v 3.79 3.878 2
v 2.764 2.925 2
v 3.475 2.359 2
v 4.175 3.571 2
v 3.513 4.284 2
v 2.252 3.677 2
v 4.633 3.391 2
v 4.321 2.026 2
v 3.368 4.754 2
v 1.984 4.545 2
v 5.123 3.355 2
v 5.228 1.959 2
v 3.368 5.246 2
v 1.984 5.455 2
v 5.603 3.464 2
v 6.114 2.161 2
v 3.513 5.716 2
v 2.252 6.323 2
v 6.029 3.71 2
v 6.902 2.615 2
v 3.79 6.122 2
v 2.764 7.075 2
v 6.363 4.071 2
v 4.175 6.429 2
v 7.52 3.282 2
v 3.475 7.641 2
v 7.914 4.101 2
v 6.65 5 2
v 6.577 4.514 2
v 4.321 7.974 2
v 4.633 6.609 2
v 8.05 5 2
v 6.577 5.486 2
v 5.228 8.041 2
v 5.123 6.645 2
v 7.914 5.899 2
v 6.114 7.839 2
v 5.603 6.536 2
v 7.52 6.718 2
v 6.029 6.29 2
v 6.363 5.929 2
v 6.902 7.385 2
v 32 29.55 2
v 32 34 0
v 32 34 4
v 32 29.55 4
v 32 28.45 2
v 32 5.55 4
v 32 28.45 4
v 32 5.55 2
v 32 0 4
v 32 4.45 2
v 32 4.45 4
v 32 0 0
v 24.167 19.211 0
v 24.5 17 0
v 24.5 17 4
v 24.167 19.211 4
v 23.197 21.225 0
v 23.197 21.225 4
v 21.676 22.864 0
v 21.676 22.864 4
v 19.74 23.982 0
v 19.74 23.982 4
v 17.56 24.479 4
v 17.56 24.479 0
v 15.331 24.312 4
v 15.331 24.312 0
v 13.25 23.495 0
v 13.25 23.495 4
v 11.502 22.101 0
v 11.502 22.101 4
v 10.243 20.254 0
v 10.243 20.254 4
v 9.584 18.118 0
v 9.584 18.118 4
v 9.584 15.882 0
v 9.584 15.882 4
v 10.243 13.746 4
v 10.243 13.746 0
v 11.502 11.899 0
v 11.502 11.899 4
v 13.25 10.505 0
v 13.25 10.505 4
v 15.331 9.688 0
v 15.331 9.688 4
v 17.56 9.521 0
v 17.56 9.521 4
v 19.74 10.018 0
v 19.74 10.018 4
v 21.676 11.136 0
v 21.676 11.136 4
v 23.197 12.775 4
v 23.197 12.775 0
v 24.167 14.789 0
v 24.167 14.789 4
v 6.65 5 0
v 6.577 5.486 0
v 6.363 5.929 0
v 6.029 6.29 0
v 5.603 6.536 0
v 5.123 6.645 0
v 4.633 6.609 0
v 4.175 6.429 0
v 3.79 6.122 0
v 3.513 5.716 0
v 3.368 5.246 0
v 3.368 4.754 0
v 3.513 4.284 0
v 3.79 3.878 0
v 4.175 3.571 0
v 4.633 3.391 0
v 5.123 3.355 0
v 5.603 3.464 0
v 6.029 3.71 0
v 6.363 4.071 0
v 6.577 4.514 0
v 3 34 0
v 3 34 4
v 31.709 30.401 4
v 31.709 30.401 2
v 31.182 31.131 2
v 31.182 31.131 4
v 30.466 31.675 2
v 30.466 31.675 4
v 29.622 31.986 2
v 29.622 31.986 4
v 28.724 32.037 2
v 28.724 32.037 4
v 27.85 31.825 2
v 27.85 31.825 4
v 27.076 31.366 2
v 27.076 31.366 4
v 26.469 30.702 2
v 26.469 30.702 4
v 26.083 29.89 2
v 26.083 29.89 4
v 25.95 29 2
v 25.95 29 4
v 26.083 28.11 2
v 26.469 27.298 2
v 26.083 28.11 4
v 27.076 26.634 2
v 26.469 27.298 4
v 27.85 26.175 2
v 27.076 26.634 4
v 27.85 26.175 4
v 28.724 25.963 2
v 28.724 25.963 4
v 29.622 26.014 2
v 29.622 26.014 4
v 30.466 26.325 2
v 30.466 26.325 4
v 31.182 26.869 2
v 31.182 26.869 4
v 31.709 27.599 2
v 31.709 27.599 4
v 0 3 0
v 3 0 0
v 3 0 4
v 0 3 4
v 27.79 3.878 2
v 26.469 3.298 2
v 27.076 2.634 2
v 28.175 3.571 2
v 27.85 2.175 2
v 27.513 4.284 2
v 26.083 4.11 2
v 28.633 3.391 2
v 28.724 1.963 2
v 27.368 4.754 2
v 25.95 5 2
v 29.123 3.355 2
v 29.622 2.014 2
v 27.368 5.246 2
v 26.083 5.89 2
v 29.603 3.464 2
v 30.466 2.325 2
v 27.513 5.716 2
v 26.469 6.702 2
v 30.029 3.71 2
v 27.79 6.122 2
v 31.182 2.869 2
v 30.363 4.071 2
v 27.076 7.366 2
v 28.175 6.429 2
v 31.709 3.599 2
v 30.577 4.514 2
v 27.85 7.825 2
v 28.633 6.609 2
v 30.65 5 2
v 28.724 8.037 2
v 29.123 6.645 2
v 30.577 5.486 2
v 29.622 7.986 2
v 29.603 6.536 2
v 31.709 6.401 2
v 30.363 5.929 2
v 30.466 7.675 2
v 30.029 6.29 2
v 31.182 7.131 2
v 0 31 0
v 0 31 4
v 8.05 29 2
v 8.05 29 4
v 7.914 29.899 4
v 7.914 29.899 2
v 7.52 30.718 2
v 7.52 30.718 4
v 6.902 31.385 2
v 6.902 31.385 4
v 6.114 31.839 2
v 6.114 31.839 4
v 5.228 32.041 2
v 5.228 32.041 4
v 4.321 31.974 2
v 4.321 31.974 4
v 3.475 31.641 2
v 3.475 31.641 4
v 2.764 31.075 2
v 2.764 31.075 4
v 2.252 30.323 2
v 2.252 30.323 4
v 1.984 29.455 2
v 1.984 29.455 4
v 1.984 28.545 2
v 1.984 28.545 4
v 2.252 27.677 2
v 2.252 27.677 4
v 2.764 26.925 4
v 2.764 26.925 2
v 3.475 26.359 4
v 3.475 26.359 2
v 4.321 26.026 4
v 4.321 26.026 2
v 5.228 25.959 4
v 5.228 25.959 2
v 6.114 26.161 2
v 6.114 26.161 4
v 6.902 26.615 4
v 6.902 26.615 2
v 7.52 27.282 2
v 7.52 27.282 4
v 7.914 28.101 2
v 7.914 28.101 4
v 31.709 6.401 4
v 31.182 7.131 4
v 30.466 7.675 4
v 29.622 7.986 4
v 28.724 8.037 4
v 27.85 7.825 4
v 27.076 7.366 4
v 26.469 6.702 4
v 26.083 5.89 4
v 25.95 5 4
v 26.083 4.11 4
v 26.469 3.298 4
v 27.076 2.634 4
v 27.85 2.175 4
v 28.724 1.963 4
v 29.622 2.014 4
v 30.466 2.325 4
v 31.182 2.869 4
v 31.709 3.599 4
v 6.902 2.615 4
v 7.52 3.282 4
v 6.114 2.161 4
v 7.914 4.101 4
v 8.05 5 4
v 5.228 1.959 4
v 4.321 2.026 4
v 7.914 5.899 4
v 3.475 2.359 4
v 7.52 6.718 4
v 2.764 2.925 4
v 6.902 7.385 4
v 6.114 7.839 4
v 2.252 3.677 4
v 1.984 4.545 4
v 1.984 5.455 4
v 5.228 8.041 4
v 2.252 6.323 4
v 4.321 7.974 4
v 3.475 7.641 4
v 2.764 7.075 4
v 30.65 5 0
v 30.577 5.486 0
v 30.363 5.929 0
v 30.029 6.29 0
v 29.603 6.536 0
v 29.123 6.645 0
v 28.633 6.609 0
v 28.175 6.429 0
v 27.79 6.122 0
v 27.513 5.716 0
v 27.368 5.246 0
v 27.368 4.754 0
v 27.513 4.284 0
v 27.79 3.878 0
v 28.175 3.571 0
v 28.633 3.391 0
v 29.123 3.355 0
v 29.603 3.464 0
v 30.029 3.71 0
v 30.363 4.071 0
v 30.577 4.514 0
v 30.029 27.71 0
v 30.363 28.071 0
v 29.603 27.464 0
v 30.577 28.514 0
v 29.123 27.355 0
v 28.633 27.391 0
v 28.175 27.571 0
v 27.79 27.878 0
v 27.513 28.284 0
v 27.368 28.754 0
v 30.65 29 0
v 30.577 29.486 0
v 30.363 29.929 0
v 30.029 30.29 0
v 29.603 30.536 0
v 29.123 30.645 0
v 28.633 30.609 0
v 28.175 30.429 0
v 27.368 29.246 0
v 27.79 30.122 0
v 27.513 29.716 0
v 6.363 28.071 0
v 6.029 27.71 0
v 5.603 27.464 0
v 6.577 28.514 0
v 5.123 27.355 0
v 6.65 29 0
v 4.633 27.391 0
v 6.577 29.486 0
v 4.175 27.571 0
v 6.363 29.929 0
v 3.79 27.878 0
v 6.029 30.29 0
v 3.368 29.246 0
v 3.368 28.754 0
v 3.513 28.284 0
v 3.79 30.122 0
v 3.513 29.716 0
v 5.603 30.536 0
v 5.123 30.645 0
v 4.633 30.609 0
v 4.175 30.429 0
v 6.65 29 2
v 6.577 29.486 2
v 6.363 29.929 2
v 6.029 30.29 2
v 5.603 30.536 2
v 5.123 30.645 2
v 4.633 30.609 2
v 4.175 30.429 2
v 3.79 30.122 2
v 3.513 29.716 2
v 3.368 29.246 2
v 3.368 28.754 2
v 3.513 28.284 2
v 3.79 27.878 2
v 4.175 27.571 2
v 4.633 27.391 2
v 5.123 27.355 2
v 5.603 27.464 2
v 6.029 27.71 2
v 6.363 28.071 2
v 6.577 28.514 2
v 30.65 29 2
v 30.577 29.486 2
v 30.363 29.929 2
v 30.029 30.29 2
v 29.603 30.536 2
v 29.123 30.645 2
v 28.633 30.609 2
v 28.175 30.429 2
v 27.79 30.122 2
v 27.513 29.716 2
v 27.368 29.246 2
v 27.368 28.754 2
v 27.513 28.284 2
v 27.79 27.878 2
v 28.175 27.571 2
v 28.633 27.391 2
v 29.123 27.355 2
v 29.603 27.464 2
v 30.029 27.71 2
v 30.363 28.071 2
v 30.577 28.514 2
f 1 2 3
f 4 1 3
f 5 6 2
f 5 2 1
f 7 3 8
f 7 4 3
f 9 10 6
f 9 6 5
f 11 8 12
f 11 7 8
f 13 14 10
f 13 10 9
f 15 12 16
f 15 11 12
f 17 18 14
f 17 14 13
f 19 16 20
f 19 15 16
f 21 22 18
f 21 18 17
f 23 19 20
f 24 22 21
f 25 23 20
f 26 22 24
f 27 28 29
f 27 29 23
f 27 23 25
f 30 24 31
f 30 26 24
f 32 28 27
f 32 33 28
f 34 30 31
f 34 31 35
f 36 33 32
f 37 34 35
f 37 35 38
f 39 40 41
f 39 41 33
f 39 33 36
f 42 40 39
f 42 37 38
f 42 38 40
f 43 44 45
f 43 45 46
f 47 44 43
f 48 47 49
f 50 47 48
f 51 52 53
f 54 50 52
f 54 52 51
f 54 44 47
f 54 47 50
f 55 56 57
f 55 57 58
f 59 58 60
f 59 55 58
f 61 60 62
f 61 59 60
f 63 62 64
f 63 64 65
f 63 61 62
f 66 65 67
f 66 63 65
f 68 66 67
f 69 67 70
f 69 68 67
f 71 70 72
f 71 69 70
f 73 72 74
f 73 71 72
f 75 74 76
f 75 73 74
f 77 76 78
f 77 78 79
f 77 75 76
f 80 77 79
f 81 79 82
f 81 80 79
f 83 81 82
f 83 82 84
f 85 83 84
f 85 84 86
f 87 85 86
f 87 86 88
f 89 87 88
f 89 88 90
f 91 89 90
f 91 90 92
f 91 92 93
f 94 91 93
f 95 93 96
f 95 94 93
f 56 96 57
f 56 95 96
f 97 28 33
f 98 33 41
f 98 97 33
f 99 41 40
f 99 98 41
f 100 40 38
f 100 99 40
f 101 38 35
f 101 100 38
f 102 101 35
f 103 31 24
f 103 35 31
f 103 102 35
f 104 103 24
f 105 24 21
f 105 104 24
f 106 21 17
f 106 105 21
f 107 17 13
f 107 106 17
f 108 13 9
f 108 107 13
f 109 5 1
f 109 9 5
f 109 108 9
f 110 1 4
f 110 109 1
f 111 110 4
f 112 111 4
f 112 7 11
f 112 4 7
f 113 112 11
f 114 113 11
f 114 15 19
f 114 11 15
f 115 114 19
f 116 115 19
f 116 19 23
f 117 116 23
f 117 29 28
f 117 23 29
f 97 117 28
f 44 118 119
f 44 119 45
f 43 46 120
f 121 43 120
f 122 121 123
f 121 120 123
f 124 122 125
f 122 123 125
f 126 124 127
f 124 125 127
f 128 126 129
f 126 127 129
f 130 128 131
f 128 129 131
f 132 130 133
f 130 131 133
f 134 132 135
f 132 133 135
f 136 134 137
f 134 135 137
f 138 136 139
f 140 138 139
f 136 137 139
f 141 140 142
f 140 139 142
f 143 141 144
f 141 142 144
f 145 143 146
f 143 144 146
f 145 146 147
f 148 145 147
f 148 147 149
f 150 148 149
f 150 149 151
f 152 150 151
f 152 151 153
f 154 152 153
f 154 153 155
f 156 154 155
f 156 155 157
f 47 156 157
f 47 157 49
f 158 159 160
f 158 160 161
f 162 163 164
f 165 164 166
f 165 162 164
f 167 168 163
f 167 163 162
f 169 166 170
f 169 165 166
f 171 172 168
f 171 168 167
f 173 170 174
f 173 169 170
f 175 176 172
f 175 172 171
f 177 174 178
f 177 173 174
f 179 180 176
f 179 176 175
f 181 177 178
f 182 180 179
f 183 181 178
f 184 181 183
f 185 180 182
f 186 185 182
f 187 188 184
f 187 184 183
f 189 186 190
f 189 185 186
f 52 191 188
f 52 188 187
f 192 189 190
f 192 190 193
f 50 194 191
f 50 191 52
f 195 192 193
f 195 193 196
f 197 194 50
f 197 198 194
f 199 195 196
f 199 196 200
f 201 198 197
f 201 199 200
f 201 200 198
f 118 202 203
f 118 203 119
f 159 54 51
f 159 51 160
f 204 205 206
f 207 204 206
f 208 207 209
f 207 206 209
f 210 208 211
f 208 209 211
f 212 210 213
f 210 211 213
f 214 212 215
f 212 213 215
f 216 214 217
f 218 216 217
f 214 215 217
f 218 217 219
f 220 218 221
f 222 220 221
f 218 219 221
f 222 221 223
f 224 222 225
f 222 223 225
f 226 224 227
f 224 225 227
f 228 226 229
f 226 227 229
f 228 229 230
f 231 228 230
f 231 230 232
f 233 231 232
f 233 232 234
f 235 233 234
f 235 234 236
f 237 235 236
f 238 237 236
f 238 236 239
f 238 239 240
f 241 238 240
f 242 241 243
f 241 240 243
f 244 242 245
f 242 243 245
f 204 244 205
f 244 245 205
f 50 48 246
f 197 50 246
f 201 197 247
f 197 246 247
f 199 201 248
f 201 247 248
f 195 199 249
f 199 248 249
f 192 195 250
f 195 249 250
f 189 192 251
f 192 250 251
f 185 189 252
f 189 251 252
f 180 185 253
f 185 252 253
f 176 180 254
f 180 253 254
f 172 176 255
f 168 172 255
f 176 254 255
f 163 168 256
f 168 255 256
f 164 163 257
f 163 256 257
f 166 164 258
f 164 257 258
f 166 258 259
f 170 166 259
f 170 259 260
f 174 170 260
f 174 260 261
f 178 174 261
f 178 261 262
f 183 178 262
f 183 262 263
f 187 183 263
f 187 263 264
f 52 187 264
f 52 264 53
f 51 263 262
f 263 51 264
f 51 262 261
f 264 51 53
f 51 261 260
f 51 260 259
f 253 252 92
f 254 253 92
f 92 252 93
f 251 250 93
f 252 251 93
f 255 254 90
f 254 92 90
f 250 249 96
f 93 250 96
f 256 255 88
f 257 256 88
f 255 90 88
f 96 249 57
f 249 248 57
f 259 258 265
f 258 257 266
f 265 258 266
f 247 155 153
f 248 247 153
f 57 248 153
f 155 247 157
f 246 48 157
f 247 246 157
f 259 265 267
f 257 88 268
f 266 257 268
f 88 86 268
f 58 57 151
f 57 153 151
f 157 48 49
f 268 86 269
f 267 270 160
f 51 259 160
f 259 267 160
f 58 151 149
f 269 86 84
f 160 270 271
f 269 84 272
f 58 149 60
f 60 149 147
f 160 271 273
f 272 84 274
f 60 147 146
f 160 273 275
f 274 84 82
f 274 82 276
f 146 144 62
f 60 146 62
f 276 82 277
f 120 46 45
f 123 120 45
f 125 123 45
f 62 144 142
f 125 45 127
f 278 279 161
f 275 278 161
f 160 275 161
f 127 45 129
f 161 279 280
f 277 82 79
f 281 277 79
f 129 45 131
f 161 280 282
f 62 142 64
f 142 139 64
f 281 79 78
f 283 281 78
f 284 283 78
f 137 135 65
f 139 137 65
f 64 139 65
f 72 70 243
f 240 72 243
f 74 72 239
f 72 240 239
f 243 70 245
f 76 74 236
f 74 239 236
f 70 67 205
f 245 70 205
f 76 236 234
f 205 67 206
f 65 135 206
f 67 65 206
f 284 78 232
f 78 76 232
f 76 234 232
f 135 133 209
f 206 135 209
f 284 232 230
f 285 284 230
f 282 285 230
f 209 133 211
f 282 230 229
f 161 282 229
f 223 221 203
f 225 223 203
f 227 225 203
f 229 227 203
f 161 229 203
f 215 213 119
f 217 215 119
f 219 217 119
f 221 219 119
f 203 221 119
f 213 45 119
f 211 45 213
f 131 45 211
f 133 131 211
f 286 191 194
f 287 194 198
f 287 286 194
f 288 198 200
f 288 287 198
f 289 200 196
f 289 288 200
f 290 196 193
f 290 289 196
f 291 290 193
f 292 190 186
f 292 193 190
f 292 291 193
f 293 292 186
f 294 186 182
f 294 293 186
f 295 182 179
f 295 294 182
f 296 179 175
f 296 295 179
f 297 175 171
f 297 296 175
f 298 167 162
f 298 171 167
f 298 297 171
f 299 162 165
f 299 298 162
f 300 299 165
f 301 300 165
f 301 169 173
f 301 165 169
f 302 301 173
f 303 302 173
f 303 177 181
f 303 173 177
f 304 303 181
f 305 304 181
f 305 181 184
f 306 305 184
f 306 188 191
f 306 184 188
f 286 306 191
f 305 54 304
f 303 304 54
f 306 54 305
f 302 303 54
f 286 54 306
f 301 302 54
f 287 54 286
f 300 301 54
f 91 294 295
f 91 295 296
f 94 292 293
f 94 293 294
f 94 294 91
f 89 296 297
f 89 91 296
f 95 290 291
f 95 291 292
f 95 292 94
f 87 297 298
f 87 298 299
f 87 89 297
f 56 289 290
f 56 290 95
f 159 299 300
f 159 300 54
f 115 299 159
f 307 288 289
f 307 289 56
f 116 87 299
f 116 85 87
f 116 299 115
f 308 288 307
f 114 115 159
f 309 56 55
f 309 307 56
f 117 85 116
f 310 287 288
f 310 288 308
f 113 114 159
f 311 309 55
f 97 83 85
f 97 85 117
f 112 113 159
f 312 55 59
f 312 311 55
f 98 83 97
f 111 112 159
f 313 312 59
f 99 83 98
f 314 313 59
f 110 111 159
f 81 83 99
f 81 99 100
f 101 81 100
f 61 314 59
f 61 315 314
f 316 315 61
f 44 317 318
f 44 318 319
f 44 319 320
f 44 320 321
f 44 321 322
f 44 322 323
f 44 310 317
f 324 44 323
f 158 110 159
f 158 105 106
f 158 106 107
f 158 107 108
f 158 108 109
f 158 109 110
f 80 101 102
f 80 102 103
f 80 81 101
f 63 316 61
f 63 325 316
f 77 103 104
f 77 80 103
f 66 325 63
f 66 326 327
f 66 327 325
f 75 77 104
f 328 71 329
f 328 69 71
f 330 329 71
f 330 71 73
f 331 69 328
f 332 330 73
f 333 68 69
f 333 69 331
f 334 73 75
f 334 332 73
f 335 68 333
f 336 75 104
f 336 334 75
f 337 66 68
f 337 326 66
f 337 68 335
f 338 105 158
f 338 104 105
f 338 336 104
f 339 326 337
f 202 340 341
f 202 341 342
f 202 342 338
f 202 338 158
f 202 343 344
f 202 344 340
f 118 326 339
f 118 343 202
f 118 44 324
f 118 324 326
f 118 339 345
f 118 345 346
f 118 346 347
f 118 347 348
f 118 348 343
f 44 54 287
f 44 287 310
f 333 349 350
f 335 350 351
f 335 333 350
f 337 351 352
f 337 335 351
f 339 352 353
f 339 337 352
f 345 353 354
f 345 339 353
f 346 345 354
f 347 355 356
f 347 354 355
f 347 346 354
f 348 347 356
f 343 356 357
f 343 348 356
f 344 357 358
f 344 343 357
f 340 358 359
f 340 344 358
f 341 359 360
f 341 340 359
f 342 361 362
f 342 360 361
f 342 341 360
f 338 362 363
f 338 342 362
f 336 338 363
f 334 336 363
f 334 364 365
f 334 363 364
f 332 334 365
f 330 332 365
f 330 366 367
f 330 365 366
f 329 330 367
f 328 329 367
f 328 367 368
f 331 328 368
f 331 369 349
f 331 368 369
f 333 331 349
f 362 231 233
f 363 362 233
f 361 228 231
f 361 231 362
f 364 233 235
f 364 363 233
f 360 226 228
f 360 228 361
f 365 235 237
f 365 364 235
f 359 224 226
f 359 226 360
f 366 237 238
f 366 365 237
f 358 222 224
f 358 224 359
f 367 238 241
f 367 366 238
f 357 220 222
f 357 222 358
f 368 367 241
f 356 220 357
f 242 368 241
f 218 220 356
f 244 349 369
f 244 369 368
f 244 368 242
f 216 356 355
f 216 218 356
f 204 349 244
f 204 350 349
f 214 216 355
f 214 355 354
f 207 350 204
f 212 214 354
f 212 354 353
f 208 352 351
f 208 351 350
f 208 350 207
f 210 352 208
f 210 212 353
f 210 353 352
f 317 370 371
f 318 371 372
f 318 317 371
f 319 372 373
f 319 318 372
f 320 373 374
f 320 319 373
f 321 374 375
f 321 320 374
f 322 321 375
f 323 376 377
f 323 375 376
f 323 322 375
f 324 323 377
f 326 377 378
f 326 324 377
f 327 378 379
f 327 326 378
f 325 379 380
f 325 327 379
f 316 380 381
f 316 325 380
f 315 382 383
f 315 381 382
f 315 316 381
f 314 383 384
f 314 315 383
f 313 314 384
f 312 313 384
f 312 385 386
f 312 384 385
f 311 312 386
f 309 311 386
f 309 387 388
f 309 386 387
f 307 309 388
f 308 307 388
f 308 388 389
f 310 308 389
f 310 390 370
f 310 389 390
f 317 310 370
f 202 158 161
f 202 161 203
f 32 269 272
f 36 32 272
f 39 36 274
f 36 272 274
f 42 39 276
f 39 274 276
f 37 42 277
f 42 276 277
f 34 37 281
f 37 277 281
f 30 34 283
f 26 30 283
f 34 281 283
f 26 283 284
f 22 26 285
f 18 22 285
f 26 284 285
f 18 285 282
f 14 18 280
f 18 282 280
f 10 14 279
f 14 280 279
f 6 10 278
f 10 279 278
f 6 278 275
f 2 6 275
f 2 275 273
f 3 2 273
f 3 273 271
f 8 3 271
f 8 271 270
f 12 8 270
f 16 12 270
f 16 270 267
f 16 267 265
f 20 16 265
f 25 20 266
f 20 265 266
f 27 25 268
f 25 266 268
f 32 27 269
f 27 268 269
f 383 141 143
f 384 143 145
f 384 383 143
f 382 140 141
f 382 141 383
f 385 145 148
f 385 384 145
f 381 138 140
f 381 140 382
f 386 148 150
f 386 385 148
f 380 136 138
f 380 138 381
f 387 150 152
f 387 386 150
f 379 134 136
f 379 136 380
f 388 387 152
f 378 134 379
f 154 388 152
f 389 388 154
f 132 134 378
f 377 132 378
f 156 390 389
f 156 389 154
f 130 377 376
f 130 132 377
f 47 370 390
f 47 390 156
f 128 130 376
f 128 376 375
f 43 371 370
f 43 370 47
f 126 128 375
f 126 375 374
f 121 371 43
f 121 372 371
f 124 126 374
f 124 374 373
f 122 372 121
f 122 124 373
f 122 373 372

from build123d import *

# Parameters (mm, degrees)
SKETCH_1_R          = 7.5
SKETCH_1_R_2        = 1.65
EXTRUDE_1_DEPTH     = 4
SKETCH_2_R          = 3.05
CUT_EXTRUDE_1_DEPTH = 2


with BuildPart() as part:
    # 草图1 → 凸台-拉伸1 (new body)
    with BuildSketch(Plane.XY):
        Polygon((0, 31), (3, 34), (32, 34), (32, 0), (3, 0), (0, 3), align=None)
        with Locations((17, 17)):
            Circle(SKETCH_1_R, mode=Mode.SUBTRACT)
        with Locations((5, 29)):
            Circle(SKETCH_1_R_2, mode=Mode.SUBTRACT)
        with Locations((29, 29)):
            Circle(SKETCH_1_R_2, mode=Mode.SUBTRACT)
        with Locations((5, 5)):
            Circle(SKETCH_1_R_2, mode=Mode.SUBTRACT)
        with Locations((29, 5)):
            Circle(SKETCH_1_R_2, mode=Mode.SUBTRACT)
    extrude(amount=EXTRUDE_1_DEPTH)

    # 草图2 → 切除-拉伸1 (cut)
    with BuildSketch(Plane.XY.offset(4)):
        with Locations((5, 29)):
            Circle(SKETCH_2_R)
        with Locations((29, 29)):
            Circle(SKETCH_2_R)
        with Locations((5, 5)):
            Circle(SKETCH_2_R)
        with Locations((29, 5)):
            Circle(SKETCH_2_R)
    extrude(amount=-CUT_EXTRUDE_1_DEPTH, mode=Mode.SUBTRACT)


solid = part.part
